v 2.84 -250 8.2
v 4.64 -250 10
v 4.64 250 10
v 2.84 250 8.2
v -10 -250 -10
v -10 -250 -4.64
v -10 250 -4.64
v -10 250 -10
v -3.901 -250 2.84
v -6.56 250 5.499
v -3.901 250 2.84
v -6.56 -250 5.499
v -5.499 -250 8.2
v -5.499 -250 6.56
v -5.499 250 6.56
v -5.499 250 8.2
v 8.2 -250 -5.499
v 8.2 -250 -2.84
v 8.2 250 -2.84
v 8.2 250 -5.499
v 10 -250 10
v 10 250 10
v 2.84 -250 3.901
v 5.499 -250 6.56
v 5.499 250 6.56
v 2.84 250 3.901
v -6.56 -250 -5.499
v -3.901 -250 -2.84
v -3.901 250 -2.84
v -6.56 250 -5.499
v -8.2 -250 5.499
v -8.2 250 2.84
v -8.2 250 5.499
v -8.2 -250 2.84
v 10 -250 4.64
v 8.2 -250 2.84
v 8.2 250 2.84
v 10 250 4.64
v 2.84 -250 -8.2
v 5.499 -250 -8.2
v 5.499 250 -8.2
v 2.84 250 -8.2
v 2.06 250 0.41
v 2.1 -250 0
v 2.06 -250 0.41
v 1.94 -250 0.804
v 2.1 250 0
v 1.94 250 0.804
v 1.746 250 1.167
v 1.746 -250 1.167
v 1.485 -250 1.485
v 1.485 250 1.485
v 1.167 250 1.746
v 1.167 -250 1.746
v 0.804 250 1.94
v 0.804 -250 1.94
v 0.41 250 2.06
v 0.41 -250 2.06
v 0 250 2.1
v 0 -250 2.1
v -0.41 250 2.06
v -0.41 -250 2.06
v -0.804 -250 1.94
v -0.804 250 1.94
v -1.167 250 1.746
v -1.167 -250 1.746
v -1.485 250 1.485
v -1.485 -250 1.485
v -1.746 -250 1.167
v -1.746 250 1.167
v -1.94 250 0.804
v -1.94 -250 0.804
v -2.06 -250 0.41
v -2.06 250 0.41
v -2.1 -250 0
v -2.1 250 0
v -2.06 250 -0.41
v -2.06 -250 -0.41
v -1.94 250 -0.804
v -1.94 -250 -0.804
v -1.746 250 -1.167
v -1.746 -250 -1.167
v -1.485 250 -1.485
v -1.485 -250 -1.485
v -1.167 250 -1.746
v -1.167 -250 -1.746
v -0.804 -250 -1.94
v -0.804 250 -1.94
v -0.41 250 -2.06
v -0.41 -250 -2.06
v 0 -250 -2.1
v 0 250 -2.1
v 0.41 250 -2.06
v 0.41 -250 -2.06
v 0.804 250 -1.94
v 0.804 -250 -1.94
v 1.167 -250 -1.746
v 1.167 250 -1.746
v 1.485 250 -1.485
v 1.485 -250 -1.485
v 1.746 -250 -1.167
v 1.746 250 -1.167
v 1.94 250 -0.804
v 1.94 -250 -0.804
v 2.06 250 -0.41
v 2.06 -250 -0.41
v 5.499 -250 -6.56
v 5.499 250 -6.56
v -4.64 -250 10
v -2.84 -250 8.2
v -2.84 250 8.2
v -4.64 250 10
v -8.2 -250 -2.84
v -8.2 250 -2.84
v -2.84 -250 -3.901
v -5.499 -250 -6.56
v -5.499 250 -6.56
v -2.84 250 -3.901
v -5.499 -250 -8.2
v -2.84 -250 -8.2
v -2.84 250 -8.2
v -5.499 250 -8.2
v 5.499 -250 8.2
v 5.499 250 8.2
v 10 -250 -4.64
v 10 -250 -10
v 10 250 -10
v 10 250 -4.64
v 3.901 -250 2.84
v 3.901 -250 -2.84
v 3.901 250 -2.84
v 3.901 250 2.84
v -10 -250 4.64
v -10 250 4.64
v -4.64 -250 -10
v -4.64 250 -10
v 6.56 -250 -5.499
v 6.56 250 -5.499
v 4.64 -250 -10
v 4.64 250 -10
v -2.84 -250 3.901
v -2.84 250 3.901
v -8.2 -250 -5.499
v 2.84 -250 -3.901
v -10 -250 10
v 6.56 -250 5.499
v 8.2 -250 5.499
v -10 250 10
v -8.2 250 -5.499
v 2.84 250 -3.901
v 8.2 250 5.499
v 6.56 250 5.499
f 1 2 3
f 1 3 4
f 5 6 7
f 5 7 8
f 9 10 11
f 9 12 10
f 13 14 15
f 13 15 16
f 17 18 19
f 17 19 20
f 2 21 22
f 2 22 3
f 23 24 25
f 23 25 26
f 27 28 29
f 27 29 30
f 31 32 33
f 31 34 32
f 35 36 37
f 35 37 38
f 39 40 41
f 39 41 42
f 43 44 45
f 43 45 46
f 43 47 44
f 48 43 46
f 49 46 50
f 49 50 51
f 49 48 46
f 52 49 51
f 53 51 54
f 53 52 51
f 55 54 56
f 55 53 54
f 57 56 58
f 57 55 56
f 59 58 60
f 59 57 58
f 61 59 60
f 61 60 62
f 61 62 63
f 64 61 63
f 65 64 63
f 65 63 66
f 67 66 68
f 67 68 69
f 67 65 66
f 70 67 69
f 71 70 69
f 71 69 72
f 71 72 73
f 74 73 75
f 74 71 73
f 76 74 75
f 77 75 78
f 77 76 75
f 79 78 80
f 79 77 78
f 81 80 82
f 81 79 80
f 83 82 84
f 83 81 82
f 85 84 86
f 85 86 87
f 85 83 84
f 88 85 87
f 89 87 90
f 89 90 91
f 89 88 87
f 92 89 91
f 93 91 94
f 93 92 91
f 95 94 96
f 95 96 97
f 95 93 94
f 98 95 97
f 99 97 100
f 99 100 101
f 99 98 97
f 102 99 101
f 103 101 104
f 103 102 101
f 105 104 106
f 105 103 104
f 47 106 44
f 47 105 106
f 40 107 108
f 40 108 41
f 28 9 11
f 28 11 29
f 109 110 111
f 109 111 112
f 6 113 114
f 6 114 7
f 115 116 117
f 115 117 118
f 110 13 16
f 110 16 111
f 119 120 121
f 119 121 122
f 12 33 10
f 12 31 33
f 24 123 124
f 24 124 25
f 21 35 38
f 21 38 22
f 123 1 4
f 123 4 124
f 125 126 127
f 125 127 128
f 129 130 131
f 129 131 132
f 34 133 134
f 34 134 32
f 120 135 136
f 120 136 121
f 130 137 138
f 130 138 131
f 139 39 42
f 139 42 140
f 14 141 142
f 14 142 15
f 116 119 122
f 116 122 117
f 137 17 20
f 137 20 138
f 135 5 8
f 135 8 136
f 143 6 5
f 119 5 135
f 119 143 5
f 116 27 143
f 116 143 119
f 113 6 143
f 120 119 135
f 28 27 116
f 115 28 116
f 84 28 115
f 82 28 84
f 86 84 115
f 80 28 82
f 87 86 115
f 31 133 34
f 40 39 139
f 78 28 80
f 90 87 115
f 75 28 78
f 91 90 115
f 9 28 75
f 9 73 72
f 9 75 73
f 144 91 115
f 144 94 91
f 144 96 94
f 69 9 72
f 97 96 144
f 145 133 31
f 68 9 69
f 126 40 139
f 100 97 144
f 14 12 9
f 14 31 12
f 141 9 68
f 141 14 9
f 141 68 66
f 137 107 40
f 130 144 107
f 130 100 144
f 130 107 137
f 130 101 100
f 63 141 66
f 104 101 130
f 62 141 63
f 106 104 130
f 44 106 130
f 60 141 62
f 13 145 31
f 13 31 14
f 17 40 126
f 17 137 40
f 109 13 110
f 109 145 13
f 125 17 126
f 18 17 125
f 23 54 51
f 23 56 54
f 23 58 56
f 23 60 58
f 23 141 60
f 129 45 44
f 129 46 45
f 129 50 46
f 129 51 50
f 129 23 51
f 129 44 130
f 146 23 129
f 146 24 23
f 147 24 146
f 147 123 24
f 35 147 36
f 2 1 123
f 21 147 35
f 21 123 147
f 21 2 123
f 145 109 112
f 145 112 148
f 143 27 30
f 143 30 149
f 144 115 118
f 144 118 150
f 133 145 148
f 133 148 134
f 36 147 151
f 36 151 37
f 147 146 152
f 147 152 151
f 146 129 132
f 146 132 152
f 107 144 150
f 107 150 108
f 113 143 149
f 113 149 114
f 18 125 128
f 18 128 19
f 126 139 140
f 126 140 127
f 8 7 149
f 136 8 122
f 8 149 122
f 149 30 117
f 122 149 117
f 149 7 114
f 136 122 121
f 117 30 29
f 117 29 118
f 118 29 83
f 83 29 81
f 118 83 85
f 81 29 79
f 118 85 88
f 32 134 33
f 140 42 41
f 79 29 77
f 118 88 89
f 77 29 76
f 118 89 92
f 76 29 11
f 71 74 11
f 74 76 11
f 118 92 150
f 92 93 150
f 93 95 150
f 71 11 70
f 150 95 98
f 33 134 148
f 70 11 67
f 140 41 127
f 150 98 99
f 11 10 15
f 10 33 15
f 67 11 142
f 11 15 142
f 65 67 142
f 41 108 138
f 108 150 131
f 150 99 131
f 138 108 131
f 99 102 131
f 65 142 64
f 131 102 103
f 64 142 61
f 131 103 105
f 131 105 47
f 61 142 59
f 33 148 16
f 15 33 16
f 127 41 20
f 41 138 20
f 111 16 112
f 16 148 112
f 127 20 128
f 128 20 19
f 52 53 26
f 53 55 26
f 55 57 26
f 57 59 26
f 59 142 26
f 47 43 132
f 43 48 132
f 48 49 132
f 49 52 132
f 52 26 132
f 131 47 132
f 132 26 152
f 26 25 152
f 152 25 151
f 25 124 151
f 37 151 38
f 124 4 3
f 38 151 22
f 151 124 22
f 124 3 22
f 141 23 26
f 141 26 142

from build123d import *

# Parameters (mm, degrees)
F0_R     = 2.1
F1_DEPTH = 250


with BuildPart() as f1:
    # F0 (on Front) → F1 (new body, symmetric)
    with BuildSketch(Plane.XZ):
        Polygon((-6.56, 5.49934), (-3.90066, 2.84), (-3.90066, 3.90066), (-2.84, 3.90066), (-5.49934, 6.56), (-5.49934, 8.2), (-2.84, 8.2), (-4.64, 10), (-10, 10), (-10, 4.64), (-8.2, 2.84), (-8.2, 5.49934), align=None)
        Polygon((-3.90066, -2.84), (-3.90066, -3.90066), (-2.84, -3.90066), (2.84, -3.90066), (3.90066, -3.90066), (3.90066, -2.84), (3.90066, 2.84), (3.90066, 3.90066), (2.84, 3.90066), (-2.84, 3.90066), (-3.90066, 3.90066), (-3.90066, 2.84), align=None)
        Circle(F0_R, mode=Mode.SUBTRACT)
        Polygon((-2.84, -3.90066), (-3.90066, -3.90066), (-3.90066, -2.84), (-6.56, -5.49934), (-8.2, -5.49934), (-8.2, -2.84), (-10, -4.64), (-10, -10), (-4.64, -10), (-2.84, -8.2), (-5.49934, -8.2), (-5.49934, -6.56), align=None)
        Polygon((3.90066, -3.90066), (2.84, -3.90066), (5.49934, -6.56), (5.49934, -8.2), (2.84, -8.2), (4.64, -10), (10, -10), (10, -4.64), (8.2, -2.84), (8.2, -5.49934), (6.56, -5.49934), (3.90066, -2.84), align=None)
        Polygon((3.90066, 3.90066), (3.90066, 2.84), (6.56, 5.49934), (8.2, 5.49934), (8.2, 2.84), (10, 4.64), (10, 10), (4.64, 10), (2.84, 8.2), (5.49934, 8.2), (5.49934, 6.56), (2.84, 3.90066), align=None)
    extrude(amount=F1_DEPTH, both=True)


solid = f1.part
